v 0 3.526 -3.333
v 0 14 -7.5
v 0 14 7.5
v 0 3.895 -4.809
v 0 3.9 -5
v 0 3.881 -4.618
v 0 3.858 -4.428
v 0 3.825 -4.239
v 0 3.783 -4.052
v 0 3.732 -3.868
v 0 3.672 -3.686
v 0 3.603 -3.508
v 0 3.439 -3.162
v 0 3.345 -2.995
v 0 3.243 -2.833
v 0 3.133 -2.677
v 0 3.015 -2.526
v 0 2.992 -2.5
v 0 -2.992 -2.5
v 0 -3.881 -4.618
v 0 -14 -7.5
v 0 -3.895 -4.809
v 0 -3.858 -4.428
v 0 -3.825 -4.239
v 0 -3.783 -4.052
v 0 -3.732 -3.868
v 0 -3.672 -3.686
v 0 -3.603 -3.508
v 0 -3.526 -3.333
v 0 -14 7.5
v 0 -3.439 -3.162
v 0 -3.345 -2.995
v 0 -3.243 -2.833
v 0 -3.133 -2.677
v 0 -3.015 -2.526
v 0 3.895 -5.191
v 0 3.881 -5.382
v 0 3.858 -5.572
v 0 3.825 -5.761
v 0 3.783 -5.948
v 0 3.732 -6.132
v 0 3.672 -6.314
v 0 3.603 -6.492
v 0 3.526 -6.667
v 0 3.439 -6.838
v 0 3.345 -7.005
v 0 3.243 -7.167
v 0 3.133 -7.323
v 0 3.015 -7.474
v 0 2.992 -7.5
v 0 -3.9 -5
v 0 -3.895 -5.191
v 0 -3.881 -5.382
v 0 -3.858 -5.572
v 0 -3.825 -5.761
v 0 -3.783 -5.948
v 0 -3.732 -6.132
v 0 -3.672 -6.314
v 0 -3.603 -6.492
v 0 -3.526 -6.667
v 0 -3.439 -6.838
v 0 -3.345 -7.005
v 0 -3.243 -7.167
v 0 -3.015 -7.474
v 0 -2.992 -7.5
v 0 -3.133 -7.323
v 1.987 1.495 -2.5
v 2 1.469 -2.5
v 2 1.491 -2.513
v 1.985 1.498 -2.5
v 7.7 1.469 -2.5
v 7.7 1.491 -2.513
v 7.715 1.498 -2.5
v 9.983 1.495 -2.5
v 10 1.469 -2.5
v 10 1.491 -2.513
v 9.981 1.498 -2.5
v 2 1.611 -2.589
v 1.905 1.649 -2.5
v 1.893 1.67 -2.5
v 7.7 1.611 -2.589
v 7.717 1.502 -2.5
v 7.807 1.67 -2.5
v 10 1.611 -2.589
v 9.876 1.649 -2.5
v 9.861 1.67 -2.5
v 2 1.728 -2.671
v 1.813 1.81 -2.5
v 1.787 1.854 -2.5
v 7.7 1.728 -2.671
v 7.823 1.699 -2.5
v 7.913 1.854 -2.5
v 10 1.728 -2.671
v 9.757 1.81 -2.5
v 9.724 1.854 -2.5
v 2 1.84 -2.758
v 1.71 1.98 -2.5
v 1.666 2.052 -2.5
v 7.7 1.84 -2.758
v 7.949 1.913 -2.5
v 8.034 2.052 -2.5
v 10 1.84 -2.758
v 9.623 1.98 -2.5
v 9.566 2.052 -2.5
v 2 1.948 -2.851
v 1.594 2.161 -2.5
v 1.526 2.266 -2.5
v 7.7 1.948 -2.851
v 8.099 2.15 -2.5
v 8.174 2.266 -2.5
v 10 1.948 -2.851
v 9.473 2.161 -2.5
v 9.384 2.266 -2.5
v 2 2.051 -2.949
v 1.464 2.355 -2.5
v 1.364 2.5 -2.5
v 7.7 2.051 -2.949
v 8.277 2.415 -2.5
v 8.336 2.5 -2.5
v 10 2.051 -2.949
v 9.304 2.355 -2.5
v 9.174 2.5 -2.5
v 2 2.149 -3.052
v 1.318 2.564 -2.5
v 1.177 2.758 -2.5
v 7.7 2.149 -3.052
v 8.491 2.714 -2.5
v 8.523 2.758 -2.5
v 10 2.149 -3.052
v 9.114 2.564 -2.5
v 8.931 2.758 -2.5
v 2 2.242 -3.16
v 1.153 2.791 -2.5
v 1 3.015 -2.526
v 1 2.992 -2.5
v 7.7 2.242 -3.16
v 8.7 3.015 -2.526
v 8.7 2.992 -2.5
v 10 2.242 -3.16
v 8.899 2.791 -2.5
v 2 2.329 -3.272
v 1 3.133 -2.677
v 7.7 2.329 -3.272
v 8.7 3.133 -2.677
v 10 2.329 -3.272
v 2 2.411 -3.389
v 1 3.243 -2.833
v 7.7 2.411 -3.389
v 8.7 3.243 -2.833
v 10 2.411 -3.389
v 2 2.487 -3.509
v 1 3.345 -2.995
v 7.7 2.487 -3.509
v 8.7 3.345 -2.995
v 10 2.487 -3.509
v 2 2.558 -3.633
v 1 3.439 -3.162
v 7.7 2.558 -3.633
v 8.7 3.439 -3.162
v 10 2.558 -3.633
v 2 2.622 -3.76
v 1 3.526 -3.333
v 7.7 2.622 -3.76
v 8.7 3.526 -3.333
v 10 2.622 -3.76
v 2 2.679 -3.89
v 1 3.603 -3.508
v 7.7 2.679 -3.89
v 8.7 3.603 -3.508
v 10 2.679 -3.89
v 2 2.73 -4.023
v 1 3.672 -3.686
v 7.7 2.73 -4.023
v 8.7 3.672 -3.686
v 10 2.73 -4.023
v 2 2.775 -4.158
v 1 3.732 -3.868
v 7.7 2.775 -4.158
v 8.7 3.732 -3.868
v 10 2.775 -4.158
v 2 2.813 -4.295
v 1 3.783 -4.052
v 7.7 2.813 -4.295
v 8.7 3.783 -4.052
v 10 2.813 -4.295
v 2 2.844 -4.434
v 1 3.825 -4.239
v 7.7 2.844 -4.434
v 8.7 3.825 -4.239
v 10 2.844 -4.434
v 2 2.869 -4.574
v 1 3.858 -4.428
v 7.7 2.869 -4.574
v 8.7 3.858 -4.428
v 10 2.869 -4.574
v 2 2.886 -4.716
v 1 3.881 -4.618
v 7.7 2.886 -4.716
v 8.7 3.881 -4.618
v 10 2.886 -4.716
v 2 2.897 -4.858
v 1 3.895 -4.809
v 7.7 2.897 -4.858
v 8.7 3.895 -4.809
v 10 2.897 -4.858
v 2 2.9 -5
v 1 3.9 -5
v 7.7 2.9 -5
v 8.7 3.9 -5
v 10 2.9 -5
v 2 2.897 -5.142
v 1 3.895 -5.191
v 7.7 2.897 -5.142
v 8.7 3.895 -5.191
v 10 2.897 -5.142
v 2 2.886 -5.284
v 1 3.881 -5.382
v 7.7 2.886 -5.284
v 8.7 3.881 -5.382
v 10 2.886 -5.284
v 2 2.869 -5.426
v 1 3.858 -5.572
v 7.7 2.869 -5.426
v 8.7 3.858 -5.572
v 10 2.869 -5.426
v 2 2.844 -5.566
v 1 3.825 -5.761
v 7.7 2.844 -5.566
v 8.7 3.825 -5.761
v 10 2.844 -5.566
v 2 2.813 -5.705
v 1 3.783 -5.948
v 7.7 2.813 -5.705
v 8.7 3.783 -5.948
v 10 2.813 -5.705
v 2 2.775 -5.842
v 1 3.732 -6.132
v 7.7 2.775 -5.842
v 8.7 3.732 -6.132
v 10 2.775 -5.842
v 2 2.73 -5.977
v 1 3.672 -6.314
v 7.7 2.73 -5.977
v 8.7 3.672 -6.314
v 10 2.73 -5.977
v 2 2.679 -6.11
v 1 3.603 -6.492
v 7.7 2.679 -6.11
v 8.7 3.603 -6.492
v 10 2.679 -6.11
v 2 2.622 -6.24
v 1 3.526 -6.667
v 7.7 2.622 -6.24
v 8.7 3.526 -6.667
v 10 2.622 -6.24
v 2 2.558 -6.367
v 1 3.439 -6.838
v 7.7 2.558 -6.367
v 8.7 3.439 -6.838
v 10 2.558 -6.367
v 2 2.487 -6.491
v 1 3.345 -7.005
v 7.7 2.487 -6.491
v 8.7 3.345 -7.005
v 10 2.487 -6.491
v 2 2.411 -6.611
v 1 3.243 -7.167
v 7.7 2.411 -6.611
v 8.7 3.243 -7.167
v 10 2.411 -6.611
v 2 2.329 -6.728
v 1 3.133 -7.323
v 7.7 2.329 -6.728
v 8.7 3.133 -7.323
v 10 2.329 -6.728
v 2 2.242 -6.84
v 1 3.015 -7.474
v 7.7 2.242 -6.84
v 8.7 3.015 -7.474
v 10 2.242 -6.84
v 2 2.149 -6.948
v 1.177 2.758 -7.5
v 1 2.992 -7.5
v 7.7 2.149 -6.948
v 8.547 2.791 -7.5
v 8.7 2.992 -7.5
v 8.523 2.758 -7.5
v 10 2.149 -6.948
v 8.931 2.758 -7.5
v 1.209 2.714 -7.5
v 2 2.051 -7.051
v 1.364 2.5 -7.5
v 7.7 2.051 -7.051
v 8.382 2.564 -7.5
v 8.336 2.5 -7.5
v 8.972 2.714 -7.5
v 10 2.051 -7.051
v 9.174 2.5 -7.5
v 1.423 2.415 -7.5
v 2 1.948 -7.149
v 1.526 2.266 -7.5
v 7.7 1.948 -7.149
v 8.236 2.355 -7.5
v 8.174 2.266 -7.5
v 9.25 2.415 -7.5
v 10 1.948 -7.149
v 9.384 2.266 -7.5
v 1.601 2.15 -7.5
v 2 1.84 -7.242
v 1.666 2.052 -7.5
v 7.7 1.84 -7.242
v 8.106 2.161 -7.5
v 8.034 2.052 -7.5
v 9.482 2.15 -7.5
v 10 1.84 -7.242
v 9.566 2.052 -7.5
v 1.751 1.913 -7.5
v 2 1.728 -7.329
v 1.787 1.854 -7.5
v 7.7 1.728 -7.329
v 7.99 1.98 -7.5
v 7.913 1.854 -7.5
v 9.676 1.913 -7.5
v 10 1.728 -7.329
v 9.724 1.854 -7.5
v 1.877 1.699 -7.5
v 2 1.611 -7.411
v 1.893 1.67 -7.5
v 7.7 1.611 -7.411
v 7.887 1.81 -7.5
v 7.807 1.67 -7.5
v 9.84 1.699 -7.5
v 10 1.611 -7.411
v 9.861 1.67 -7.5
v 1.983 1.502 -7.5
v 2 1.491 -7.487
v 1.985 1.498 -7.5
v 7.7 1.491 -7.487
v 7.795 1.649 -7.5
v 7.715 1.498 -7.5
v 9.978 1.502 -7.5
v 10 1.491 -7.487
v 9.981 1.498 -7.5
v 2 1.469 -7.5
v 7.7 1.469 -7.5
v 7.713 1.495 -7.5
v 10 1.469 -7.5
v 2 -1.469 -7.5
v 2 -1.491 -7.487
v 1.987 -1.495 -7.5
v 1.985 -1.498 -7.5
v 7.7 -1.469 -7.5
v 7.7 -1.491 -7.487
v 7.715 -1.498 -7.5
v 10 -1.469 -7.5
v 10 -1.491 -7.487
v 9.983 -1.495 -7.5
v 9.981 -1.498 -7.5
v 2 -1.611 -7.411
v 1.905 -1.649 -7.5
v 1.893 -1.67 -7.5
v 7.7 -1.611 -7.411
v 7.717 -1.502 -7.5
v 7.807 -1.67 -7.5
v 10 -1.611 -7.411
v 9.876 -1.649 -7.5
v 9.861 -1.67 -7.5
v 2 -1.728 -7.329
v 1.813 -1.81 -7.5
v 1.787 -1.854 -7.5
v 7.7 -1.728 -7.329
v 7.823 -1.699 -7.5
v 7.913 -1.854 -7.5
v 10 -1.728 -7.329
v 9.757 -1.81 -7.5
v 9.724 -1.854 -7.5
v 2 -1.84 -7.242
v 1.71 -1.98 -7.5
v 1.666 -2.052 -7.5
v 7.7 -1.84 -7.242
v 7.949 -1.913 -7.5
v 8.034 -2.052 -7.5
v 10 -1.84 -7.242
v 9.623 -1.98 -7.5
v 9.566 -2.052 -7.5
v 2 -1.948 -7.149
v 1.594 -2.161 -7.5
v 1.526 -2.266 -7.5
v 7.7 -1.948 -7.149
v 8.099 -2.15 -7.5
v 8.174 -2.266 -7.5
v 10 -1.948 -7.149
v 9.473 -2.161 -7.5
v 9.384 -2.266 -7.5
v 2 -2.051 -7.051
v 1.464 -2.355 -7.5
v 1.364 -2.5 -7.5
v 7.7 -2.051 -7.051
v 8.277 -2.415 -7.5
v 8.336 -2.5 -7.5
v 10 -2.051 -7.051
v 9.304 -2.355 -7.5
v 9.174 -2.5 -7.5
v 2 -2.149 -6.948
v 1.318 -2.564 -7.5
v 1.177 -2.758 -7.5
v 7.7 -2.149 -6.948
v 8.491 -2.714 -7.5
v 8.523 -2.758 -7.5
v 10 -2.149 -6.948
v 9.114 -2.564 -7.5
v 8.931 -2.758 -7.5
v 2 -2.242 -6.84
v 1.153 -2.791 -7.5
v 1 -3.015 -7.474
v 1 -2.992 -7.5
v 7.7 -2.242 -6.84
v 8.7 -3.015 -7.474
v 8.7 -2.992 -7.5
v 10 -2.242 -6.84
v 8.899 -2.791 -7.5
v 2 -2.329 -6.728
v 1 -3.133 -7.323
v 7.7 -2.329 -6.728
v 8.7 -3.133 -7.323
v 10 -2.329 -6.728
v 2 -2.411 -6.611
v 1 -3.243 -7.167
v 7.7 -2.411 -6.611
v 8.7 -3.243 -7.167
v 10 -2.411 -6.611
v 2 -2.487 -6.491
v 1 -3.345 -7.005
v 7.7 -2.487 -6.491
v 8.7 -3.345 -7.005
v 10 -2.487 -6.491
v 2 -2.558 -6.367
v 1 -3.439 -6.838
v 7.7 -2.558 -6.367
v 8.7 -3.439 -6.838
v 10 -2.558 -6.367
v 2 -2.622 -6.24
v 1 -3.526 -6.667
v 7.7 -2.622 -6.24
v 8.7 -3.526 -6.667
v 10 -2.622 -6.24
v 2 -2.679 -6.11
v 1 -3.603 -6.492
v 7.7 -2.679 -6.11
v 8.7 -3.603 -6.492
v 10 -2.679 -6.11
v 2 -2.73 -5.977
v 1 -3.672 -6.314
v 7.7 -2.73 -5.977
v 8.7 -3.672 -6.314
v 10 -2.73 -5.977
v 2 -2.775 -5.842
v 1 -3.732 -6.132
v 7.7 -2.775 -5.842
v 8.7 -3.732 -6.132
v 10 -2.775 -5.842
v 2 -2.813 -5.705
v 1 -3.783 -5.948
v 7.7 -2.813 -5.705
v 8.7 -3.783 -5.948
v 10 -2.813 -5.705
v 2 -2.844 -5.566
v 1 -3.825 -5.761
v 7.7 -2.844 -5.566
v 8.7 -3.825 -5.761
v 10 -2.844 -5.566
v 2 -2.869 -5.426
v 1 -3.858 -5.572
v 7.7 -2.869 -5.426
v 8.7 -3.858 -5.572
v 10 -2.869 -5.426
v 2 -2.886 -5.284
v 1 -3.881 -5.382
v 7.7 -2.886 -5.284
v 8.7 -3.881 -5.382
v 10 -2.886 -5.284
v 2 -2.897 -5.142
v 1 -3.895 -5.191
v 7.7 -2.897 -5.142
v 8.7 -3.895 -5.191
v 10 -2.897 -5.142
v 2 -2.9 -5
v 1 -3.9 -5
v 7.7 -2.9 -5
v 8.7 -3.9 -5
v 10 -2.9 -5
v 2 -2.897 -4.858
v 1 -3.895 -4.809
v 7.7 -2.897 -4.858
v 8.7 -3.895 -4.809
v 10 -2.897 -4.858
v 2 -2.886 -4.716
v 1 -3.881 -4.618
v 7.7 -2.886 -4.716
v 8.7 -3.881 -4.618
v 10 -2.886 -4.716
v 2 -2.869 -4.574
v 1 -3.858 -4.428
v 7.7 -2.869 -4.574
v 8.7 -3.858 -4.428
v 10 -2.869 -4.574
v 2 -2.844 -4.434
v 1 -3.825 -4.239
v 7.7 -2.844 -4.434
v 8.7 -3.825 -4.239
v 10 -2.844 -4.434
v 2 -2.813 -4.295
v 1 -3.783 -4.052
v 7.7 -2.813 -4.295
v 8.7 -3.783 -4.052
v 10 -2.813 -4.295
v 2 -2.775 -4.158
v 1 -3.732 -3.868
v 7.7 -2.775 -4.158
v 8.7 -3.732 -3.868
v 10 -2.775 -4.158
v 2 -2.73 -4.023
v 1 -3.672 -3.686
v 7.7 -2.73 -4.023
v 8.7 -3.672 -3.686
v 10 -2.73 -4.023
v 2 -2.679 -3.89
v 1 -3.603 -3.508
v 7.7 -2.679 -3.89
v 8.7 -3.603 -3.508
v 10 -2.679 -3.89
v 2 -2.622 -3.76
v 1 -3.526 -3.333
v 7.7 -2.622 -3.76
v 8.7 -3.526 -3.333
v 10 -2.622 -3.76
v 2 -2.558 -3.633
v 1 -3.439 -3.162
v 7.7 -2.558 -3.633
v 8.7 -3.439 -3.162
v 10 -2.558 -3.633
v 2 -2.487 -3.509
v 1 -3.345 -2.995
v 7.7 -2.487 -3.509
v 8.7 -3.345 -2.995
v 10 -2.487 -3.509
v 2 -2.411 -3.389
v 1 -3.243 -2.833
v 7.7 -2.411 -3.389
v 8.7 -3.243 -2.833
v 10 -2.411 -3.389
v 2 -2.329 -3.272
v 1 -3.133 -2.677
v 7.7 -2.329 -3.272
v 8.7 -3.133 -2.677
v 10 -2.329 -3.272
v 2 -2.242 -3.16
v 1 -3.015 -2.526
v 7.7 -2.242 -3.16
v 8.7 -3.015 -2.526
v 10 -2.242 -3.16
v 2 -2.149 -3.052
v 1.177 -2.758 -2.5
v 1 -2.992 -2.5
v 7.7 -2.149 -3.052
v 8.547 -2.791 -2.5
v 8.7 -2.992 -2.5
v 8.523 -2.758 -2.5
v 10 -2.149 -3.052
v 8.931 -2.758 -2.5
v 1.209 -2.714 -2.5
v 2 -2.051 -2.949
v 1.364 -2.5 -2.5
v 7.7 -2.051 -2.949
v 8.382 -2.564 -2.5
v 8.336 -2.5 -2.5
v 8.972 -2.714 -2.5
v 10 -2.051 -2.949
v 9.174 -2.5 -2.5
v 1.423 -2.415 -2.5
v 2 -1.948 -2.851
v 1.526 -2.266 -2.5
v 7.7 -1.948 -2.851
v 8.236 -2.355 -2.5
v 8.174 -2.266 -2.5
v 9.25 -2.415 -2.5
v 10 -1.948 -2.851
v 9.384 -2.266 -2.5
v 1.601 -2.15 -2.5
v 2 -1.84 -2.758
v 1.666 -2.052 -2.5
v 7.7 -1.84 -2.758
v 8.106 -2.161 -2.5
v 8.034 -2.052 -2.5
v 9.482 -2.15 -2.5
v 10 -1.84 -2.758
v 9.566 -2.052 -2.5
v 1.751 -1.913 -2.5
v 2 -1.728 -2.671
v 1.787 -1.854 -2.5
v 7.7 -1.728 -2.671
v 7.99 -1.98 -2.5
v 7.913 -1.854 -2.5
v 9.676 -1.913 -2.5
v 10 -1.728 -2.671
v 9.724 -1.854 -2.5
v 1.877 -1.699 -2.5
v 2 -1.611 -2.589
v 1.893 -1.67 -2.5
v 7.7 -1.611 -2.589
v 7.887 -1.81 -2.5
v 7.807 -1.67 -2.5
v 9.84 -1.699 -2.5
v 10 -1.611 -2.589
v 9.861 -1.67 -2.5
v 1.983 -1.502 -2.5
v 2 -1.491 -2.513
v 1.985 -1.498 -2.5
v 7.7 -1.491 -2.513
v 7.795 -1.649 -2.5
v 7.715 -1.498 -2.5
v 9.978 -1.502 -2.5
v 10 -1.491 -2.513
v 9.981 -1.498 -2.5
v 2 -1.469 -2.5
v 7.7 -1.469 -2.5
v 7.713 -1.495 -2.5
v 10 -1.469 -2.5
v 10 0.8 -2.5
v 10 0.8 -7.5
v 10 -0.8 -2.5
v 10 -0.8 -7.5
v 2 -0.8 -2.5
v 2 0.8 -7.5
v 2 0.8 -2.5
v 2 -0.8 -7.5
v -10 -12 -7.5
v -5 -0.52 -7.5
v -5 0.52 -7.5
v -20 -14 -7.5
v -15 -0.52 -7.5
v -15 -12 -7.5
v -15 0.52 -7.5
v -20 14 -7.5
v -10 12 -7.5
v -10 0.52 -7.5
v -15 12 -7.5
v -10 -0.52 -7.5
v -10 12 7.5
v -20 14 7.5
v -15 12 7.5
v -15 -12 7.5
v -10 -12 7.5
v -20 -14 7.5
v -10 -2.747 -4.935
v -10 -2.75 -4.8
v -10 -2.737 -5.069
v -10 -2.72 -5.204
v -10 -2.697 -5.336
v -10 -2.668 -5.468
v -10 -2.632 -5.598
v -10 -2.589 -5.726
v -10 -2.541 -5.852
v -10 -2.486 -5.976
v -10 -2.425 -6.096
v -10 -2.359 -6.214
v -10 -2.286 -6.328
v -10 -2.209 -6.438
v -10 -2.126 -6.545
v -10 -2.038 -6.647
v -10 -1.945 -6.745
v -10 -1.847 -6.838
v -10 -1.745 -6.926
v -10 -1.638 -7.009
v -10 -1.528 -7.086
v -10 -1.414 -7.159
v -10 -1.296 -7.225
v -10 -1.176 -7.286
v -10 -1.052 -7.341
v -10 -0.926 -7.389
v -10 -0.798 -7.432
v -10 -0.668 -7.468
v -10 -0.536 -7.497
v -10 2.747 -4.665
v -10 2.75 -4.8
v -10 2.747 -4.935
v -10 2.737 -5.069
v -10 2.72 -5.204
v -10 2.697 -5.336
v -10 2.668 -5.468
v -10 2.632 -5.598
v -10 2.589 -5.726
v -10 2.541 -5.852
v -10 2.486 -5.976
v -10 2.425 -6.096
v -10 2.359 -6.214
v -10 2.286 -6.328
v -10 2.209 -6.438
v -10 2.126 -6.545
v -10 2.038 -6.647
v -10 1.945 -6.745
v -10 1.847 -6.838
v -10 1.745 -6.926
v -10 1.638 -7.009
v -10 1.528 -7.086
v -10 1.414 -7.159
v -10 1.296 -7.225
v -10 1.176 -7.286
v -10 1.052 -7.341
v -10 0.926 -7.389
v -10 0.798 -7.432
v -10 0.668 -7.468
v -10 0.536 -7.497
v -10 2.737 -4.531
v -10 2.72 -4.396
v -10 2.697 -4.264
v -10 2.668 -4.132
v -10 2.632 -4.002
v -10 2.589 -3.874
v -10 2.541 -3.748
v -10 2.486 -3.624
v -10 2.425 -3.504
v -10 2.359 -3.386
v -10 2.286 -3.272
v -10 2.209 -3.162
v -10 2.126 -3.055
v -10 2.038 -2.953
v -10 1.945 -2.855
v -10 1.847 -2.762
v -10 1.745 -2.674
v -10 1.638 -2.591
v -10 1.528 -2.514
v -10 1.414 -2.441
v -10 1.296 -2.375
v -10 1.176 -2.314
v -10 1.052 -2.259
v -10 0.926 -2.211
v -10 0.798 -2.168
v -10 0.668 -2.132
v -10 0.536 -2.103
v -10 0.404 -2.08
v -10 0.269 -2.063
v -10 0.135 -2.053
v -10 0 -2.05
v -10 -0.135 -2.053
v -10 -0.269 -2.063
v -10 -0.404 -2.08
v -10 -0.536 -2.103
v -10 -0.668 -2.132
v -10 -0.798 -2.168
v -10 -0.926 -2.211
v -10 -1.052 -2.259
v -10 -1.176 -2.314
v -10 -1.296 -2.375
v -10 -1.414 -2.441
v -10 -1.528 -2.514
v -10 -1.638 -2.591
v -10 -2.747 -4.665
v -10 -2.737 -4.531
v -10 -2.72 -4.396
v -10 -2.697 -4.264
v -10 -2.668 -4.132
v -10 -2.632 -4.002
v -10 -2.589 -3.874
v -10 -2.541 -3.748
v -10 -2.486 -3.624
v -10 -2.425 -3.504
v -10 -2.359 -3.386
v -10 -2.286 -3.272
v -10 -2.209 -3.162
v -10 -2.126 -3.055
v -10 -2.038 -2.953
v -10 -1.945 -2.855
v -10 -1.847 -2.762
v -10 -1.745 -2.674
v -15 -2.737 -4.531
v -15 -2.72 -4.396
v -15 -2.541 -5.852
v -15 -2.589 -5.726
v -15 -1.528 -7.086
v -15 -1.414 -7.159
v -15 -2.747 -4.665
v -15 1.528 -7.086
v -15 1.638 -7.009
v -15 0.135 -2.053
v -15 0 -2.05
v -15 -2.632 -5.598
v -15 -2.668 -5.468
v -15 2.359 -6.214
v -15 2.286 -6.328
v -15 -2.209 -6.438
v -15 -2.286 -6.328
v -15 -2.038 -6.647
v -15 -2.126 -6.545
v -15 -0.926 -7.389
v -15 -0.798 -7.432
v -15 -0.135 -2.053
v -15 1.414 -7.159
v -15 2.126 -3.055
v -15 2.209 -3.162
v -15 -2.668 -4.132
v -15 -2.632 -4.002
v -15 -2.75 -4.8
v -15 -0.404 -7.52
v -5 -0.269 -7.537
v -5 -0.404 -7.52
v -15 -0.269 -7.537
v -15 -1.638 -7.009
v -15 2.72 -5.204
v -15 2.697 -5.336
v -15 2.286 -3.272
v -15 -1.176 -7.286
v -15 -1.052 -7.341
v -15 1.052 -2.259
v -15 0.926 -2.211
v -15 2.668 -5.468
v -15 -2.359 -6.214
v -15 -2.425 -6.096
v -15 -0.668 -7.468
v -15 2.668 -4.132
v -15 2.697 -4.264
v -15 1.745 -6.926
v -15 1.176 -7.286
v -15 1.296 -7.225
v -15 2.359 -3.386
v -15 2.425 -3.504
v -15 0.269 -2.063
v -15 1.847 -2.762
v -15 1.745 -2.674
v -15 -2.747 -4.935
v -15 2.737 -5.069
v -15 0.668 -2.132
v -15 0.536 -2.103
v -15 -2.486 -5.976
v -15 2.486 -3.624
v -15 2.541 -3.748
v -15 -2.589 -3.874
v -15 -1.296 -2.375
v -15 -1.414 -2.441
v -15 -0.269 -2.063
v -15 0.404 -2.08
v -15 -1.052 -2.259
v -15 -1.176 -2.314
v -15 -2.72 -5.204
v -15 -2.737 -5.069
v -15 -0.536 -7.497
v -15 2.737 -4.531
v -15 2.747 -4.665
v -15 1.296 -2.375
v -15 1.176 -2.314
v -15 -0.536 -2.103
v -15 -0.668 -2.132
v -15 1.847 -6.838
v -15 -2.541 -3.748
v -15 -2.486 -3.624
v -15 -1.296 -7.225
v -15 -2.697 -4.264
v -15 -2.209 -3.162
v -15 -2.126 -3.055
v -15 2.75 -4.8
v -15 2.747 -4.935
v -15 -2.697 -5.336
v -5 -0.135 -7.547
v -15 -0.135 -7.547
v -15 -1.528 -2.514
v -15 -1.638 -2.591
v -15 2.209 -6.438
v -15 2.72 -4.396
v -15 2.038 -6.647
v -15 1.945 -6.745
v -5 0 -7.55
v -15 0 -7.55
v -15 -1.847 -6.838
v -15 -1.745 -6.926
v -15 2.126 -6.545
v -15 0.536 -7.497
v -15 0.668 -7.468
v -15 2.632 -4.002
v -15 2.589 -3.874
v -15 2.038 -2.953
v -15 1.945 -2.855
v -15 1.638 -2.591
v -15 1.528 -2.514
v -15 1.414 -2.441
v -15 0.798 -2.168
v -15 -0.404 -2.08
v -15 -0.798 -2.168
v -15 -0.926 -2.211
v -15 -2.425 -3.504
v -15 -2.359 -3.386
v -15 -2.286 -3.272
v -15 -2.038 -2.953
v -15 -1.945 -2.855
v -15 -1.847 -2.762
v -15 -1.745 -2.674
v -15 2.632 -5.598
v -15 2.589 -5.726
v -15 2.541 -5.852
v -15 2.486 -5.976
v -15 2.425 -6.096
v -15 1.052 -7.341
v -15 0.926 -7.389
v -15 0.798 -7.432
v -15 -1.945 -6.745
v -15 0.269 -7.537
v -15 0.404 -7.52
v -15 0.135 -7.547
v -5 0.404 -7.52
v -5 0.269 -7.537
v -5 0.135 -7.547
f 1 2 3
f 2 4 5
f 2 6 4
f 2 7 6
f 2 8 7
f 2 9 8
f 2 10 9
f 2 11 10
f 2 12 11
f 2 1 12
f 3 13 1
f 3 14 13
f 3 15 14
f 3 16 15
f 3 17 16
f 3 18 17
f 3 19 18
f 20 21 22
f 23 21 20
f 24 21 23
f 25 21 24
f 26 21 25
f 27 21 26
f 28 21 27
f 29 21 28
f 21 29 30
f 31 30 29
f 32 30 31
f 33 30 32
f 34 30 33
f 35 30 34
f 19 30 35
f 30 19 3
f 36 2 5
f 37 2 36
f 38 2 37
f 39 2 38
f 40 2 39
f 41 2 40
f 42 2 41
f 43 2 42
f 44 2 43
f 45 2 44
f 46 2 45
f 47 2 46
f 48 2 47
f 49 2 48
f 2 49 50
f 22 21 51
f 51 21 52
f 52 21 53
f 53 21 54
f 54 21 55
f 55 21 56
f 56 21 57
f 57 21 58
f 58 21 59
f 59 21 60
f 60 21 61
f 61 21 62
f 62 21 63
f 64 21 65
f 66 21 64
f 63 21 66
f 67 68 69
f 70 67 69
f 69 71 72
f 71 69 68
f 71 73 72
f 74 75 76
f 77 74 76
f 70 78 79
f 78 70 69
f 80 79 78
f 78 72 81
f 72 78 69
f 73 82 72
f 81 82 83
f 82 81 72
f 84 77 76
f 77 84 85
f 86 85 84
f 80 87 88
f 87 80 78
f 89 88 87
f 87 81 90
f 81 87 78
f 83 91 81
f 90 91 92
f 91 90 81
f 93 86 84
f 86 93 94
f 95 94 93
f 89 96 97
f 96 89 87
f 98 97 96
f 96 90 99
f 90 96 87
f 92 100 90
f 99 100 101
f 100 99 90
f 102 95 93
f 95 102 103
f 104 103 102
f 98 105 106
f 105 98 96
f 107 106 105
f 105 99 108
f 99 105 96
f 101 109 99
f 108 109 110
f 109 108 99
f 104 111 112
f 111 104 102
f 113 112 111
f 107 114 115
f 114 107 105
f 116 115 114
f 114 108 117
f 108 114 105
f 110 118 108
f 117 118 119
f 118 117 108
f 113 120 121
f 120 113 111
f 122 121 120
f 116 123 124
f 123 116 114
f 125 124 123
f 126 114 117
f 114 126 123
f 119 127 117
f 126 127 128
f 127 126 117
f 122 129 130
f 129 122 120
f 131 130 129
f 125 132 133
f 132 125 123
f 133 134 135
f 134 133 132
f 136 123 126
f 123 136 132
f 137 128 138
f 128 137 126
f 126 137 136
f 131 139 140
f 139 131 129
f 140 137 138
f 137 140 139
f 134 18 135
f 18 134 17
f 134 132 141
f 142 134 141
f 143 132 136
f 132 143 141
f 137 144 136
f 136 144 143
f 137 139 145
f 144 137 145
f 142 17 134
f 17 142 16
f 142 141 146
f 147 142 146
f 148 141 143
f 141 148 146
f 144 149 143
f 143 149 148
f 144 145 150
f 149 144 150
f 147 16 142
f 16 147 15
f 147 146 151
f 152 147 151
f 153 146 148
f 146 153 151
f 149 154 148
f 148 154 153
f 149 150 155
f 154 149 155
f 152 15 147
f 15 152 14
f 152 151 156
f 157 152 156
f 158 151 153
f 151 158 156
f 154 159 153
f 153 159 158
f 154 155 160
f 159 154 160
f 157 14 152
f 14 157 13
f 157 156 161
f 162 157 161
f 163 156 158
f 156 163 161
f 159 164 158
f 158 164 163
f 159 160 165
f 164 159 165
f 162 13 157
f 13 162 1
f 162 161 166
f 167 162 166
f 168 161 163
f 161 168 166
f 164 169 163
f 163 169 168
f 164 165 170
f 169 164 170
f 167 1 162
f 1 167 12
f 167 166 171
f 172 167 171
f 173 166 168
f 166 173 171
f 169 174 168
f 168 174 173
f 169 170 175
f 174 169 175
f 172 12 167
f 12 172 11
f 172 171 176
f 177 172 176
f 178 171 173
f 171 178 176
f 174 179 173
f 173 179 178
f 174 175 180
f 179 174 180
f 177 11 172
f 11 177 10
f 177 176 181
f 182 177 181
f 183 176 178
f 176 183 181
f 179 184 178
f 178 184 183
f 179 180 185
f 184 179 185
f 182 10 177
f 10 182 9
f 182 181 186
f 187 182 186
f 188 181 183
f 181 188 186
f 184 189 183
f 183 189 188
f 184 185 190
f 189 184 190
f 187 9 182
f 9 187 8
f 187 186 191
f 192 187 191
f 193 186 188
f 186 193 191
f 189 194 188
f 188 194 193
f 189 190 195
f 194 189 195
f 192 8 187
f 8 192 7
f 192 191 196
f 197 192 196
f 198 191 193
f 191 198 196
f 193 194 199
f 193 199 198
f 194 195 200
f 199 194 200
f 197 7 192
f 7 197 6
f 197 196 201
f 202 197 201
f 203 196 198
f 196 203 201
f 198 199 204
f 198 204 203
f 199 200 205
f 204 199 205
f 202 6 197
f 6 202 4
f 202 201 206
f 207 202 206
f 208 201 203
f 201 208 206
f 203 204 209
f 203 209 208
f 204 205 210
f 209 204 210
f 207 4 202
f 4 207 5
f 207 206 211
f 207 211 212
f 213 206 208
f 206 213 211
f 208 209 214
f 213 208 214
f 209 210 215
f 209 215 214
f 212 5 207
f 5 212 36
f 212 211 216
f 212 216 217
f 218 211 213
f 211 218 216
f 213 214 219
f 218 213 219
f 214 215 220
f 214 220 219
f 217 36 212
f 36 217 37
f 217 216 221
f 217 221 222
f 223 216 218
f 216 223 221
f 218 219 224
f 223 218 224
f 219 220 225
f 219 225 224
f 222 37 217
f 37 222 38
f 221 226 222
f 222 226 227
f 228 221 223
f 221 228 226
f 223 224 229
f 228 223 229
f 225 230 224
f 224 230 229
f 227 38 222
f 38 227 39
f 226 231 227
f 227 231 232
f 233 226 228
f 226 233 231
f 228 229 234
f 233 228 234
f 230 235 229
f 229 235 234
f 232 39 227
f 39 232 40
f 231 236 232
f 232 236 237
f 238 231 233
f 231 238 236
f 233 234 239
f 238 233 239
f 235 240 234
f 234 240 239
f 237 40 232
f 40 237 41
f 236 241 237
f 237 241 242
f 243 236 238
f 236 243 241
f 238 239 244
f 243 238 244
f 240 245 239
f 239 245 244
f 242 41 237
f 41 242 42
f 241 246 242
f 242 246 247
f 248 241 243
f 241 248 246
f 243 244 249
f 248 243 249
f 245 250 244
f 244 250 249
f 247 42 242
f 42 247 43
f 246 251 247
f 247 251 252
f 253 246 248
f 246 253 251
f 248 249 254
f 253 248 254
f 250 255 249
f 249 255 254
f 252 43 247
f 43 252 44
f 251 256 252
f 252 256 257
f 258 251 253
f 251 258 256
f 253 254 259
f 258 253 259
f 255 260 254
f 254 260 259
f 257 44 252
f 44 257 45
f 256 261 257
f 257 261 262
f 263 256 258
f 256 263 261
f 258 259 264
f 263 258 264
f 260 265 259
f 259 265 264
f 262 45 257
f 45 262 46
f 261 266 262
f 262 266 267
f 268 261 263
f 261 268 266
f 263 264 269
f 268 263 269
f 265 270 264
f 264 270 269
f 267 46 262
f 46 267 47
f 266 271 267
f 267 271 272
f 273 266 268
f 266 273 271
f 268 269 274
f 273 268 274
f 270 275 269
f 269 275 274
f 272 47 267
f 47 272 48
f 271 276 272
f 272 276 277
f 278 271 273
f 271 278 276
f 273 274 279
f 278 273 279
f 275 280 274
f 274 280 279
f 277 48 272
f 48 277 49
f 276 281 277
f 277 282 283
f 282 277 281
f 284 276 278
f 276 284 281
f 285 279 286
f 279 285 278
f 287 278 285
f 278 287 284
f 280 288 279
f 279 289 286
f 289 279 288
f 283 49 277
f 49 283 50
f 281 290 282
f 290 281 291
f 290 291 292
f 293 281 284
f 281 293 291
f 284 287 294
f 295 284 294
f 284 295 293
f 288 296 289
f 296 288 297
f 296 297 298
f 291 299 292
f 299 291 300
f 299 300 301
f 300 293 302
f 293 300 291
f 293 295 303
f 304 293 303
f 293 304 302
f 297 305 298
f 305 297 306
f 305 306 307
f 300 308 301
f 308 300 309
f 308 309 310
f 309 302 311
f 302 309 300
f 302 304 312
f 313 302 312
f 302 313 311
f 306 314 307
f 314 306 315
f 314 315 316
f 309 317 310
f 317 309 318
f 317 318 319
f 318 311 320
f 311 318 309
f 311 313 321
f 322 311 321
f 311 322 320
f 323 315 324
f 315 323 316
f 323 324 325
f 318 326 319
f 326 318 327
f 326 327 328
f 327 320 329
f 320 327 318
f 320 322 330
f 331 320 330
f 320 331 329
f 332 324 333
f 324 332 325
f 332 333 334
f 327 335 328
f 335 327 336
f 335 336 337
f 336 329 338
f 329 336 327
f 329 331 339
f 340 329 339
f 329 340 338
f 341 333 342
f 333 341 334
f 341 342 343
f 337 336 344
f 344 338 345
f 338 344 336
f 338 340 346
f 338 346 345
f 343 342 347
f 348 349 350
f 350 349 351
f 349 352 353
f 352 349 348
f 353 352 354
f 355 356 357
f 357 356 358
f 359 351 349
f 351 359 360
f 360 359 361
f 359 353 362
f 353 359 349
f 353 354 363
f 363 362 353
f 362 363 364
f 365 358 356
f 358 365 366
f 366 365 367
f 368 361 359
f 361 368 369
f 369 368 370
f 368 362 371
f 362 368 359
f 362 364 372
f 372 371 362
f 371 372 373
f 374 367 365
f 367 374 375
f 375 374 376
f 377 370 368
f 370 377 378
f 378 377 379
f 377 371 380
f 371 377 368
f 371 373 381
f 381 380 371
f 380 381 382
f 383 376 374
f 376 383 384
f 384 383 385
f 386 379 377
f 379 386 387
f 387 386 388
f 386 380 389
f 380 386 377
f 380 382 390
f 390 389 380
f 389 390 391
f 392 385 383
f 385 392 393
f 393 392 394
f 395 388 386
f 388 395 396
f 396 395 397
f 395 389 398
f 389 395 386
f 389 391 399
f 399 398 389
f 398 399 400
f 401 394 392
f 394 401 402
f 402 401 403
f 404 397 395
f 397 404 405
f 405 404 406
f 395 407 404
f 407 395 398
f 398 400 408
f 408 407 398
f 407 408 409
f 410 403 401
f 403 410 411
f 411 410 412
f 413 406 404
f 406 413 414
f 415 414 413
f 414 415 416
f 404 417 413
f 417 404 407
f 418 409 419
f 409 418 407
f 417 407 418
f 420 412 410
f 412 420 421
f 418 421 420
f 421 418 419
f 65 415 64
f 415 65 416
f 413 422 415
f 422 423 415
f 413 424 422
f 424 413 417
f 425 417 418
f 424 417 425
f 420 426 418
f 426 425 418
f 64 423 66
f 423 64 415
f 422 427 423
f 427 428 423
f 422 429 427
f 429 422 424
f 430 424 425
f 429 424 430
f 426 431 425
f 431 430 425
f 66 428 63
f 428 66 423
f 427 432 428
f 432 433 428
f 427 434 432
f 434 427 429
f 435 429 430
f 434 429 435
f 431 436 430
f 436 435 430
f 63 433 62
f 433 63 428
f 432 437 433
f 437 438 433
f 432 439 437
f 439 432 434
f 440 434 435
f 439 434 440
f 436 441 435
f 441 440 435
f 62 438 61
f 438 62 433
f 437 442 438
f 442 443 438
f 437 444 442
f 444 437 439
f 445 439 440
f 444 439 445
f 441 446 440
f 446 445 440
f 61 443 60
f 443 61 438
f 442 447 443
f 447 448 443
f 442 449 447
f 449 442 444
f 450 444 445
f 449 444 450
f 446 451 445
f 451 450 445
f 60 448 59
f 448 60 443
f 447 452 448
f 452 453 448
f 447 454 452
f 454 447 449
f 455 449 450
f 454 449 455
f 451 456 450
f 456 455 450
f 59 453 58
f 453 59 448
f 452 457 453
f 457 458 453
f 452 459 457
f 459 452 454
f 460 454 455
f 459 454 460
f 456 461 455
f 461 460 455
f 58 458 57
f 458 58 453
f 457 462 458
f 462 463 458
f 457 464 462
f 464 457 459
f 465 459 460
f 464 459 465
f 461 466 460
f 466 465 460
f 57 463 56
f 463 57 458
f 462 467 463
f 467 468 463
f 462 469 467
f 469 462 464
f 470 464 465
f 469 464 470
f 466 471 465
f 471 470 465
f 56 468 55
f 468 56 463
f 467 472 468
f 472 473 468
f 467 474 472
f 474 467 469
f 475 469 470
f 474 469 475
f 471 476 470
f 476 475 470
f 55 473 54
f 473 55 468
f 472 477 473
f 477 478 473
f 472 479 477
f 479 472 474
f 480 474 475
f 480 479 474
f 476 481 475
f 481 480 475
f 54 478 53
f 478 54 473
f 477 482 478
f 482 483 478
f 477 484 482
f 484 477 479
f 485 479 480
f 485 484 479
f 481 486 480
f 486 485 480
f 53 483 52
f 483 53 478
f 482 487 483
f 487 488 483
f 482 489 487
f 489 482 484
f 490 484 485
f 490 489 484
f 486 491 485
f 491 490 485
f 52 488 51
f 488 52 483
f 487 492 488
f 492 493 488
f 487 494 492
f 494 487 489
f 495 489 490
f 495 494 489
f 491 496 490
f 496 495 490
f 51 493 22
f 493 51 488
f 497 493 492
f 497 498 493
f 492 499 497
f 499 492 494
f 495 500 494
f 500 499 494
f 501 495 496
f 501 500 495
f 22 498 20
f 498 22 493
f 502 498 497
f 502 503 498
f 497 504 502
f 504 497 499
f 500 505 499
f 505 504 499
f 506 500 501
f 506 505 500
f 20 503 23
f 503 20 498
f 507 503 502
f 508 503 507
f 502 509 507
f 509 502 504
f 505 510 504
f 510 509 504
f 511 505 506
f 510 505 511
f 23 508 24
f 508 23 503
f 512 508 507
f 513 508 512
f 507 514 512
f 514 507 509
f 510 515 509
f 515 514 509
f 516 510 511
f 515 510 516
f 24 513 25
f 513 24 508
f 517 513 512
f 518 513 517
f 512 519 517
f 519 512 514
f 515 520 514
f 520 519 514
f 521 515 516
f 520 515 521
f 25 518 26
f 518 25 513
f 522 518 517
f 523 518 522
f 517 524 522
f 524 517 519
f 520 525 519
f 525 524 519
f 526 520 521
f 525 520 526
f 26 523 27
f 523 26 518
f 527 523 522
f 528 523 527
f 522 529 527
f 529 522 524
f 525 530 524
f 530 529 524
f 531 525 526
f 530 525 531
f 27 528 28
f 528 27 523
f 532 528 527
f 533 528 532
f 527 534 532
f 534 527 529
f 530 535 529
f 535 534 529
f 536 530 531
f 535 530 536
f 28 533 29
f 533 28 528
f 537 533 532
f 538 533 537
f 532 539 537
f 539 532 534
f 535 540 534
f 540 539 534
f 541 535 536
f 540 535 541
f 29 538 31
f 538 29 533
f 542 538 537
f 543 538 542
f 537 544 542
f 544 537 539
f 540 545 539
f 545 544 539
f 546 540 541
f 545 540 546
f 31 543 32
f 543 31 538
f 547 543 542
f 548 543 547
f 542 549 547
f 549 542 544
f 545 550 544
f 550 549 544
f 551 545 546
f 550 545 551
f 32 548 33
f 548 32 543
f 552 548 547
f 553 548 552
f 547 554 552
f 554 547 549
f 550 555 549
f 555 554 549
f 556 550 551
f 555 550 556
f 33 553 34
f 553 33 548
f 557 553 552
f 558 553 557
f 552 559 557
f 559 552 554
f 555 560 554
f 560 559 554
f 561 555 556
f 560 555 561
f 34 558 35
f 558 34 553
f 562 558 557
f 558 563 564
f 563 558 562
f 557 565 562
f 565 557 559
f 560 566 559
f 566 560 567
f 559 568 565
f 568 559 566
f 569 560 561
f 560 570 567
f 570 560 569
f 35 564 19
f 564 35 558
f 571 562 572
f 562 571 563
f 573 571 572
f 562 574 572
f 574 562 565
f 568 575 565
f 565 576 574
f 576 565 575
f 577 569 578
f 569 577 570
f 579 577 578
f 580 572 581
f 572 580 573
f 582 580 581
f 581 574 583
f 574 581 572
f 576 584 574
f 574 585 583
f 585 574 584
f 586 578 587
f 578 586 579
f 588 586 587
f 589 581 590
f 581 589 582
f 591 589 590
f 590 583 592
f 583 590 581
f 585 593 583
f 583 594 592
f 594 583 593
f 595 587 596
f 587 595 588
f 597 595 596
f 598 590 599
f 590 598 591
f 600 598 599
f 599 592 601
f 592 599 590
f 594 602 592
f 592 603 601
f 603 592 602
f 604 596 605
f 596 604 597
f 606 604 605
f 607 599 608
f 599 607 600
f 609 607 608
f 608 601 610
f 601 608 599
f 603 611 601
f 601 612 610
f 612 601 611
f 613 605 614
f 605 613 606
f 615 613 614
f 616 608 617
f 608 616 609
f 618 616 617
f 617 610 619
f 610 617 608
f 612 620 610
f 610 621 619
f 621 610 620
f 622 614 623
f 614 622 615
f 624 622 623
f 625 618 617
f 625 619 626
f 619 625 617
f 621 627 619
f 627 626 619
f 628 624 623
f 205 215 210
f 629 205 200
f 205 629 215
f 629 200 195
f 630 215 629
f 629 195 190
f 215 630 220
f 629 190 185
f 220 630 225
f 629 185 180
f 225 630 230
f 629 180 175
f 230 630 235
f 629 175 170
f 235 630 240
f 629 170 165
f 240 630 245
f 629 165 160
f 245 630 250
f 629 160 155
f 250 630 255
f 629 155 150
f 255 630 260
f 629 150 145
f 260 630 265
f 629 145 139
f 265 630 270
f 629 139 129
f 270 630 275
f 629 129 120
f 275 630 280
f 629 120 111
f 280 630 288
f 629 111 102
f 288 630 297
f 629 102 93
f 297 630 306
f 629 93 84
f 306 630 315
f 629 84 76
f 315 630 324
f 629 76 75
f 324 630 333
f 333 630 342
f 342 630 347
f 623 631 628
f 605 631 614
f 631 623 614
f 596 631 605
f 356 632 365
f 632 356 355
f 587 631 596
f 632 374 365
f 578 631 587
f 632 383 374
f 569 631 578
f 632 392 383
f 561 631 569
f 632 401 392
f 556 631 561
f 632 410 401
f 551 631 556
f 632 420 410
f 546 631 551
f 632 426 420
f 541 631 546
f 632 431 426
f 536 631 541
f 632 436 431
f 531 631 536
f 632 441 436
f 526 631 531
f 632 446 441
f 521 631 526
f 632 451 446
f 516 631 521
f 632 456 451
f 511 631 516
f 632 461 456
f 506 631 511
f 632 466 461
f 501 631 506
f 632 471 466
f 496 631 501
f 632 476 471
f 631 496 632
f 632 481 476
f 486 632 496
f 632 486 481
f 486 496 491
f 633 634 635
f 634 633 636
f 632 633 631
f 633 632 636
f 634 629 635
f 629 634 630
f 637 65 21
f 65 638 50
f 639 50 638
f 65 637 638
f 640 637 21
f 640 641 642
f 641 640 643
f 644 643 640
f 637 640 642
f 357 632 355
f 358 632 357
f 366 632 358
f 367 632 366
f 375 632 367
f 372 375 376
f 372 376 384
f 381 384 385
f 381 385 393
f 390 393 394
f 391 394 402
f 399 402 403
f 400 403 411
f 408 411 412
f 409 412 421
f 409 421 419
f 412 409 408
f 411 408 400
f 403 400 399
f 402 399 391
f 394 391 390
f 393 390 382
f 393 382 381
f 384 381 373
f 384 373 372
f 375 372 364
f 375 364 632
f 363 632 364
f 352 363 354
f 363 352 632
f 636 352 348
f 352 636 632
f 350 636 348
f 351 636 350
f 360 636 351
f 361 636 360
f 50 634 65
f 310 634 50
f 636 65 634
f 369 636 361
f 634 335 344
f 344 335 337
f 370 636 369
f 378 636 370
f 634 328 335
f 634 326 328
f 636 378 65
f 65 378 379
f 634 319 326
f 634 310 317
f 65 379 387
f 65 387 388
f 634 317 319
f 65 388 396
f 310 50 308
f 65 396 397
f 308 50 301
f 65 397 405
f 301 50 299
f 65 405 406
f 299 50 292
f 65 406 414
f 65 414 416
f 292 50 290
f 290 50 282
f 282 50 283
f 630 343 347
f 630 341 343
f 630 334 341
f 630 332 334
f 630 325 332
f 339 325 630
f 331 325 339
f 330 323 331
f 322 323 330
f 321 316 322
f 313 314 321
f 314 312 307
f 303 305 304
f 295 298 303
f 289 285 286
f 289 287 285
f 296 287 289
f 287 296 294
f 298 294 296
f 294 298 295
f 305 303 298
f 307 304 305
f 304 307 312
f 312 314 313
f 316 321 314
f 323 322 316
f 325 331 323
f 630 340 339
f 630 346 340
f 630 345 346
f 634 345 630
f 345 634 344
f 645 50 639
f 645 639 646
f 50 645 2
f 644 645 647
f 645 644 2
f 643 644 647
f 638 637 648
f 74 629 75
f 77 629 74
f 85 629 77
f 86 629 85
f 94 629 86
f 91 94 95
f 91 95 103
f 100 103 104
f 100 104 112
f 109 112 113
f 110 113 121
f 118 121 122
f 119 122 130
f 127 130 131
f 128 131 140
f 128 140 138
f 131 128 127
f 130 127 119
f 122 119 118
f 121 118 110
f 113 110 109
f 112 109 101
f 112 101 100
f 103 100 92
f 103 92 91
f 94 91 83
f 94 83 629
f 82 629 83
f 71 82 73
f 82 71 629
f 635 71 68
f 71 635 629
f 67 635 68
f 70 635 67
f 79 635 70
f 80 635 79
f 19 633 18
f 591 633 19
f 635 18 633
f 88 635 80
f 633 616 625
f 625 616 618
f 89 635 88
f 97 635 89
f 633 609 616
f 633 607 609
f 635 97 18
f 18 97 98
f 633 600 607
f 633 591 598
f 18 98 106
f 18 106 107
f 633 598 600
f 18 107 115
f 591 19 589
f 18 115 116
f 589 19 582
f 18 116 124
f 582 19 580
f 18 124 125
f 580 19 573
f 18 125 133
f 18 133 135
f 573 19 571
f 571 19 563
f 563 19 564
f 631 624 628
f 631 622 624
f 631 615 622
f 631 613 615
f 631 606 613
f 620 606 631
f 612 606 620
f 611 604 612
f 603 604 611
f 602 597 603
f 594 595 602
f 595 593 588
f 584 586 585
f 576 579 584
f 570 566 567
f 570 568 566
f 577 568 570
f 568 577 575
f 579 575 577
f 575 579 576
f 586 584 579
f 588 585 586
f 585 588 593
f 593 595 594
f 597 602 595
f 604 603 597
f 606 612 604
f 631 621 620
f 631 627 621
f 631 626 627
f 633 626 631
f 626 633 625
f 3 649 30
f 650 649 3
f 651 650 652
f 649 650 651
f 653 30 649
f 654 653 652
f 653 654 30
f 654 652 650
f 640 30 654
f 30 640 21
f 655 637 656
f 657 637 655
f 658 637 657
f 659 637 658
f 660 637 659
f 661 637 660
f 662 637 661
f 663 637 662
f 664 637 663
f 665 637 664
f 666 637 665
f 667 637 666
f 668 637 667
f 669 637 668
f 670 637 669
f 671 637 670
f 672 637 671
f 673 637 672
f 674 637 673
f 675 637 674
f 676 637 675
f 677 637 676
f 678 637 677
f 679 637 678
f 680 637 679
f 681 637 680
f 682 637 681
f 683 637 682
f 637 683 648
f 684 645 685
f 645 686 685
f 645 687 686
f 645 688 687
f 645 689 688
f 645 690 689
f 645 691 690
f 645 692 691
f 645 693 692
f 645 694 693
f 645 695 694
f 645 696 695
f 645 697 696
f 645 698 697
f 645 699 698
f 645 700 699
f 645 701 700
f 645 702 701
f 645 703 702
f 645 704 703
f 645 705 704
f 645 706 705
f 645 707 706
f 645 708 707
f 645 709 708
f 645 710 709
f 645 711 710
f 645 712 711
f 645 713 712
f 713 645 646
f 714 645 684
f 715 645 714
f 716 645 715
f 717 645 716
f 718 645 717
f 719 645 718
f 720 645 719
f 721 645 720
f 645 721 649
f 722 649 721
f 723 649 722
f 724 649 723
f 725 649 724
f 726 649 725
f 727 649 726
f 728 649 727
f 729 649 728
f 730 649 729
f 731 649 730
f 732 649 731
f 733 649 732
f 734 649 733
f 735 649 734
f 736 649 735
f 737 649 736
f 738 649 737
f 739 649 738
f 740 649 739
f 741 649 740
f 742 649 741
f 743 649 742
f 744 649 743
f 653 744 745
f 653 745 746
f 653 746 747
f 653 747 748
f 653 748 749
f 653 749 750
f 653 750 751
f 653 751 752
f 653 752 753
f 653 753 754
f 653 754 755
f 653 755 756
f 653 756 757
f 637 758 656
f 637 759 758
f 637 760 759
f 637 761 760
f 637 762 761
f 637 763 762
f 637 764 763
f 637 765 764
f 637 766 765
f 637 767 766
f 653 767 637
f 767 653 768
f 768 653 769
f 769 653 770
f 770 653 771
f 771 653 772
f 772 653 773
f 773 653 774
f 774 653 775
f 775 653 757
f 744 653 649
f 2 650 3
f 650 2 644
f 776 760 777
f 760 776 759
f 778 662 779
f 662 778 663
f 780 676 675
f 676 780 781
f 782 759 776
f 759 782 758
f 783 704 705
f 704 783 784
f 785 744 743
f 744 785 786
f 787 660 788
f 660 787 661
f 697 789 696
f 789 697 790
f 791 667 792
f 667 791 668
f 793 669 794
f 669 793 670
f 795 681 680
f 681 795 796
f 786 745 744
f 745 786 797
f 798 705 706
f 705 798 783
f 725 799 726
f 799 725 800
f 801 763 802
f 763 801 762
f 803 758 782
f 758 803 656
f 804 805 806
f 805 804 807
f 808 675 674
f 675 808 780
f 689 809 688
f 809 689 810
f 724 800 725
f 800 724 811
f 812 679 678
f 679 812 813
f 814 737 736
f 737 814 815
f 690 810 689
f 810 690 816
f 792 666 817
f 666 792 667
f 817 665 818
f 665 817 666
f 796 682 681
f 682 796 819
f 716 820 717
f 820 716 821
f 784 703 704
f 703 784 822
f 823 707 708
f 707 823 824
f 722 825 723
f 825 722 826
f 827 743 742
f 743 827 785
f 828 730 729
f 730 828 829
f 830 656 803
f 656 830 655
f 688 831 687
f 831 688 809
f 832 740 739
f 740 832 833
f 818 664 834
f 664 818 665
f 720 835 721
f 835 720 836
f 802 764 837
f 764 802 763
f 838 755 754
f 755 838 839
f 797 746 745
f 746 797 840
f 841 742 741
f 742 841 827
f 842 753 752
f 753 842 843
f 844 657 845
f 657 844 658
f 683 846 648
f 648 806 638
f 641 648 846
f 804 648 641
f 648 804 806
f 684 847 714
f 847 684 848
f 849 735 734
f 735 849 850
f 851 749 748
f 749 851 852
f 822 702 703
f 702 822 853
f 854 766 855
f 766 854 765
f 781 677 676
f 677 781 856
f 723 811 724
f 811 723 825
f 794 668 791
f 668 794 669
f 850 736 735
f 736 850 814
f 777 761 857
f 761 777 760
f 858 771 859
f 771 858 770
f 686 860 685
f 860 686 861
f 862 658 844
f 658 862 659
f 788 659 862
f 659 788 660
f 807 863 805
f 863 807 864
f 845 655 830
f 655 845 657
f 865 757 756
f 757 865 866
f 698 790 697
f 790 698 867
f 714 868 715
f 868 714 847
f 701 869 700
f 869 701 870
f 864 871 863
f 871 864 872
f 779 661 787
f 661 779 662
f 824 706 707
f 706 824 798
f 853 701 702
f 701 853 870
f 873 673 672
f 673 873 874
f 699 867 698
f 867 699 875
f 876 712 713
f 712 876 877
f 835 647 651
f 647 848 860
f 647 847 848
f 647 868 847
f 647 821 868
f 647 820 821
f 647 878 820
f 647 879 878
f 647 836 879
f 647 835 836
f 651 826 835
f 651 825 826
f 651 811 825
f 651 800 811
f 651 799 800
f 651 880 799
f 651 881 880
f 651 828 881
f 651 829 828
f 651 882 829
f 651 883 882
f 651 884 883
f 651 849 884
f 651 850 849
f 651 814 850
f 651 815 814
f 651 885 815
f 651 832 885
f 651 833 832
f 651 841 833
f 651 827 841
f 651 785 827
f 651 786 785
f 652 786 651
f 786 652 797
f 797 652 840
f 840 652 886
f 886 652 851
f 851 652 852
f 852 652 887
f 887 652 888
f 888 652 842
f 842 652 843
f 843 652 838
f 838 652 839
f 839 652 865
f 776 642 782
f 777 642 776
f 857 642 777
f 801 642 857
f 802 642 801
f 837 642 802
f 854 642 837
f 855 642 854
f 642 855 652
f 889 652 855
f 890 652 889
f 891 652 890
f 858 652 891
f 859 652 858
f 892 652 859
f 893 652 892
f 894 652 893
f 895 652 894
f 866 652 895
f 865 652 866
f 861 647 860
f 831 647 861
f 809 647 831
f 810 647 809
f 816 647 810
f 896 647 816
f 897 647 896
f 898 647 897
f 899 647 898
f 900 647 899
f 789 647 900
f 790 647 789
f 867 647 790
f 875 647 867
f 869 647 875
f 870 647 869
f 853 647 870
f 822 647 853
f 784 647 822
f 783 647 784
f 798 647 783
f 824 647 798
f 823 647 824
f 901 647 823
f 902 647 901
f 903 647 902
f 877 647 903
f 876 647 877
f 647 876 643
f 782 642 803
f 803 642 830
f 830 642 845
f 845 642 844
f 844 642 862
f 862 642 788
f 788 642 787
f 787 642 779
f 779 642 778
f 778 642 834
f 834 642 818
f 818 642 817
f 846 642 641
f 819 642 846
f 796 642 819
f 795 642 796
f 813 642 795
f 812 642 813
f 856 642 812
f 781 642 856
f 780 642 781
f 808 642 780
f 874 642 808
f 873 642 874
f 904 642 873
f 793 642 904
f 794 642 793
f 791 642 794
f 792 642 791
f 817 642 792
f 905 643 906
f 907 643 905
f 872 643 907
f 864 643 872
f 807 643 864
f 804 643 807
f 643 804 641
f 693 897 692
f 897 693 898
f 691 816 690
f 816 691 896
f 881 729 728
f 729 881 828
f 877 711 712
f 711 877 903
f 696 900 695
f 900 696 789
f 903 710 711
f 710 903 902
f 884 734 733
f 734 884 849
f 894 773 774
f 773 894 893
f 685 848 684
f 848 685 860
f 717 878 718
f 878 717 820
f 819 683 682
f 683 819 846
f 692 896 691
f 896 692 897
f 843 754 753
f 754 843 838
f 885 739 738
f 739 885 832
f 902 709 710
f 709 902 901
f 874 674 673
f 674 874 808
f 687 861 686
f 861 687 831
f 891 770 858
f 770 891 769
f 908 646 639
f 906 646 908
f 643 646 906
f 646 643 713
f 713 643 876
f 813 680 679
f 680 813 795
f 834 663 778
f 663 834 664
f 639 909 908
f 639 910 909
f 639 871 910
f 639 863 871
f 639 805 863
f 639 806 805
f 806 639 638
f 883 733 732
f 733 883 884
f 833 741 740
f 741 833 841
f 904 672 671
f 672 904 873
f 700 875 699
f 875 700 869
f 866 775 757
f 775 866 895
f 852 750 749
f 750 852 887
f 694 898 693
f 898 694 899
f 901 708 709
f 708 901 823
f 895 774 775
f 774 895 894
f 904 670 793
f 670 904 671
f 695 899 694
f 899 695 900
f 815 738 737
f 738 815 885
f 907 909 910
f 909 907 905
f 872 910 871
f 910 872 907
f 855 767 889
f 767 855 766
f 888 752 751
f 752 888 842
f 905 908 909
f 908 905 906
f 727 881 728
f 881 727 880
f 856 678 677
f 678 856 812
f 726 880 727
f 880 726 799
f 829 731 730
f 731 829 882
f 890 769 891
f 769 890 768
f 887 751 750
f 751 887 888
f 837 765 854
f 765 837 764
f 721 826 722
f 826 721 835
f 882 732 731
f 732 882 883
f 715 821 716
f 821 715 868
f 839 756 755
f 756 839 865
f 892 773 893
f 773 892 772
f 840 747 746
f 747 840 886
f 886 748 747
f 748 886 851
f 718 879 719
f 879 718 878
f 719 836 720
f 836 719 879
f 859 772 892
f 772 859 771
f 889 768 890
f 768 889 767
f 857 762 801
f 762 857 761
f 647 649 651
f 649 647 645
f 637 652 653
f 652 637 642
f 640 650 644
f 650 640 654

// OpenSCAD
rotate([0.0, -90.0, 0.0])
{
    union()
    {
        rotate([0.0, 90.0, 0.0])
        {
            translate([0.0, 0.0, -5.0])
            {
                rotate([0.0, 90.0, 0.0])
                {
                    intersection()
                    {
                        difference()
                        {
                            rotate_extrude(angle = 360.0, $fn = 128)
                            {
                                M66();
                            }
                            translate([0.0, 0.0, 2.0])
                            {
                                linear_extrude(height = 10.0, twist = 0.0, scale = 1.0, slices = 1, center = false)
                                {
                                    scale([10.0, 1.6])
                                    {
                                        M8();
                                    }
                                }
                            }
                        }
                        linear_extrude(height = 10.0, twist = 0.0, scale = 1.0, slices = 1, center = false)
                        {
                            scale([5.0, 10.0])
                            {
                                M8();
                            }
                        }
                    }
                }
            }
        }
        translate([0.0, 0.0, 0.0])
        {
            linear_extrude(height = 10.0, twist = 0.0, scale = 1.0, slices = 1, center = false)
            {
                scale([15.0, 28.0])
                {
                    M8();
                }
            }
        }
        translate([-4.8, 0.0, 5.0])
        {
            translate([0.0, 0.0, 5.0])
            {
                linear_extrude(height = 10.0, twist = 0.0, scale = 1.0, slices = 1, center = true)
                {
                    scale([5.5, 5.5])
                    {
                        M211();
                    }
                }
            }
        }
        translate([0.0, 13.0, 10.0])
        {
            linear_extrude(height = 5.0, twist = 0.0, scale = 1.0, slices = 1, center = false)
            {
                scale([15.0, 2.0])
                {
                    M8();
                }
            }
        }
        translate([0.0, -13.0, 10.0])
        {
            linear_extrude(height = 5.0, twist = 0.0, scale = 1.0, slices = 1, center = false)
            {
                scale([15.0, 2.0])
                {
                    M8();
                }
            }
        }
        translate([0.0, 0.0, 15.0])
        {
            linear_extrude(height = 5.0, twist = 0.0, scale = 1.0, slices = 1, center = false)
            {
                scale([15.0, 28.0])
                {
                    M8();
                }
            }
        }
    }
}

module M66()
{
    polygon
    (
        points =
        [
            [0.0, 0.0], 
            [3.9, 0.0], 
            [3.9, 1.0], 
            [2.9, 2.0], 
            [2.9, 7.7], 
            [3.9, 8.7], 
            [2.9, 10.0], 
            [0.0, 10.0], 
            [0.0, 2.0]
        ],
        paths =
        [
            [0, 1, 2, 3, 4, 5, 6, 7, 8]
        ]
    );
}

module M211()
{
    polygon
    (
        points =
        [
            [0.5, 0.0], 
            [0.4993977281025862, 0.024533837163709007], 
            [0.49759236333609846, 0.0490085701647803], 
            [0.4945882549823905, 0.07336523722768087], 
            [0.4903926402016152, 0.09754516100806412], 
            [0.485015626597272, 0.12149008995163194], 
            [0.4784701678661044, 0.14514233862723117], 
            [0.4707720325915104, 0.16844492669611003], 
            [0.46193976625564337, 0.1913417161825449], 
            [0.45199464656172167, 0.21377754671514104], 
            [0.4409606321741775, 0.23569836841299882], 
            [0.42886430500013606, 0.25705137209661083], 
            [0.4157348061512726, 0.2777851165098011], 
            [0.40160376574032247, 0.2978496522462167], 
            [0.3865052266813685, 0.31719664208182274], 
            [0.37047556267747955, 0.33577947742350917], 
            [0.3535533905932738, 0.35355339059327373], 
            [0.33577947742350917, 0.37047556267747955], 
            [0.31719664208182274, 0.3865052266813685], 
            [0.29784965224621673, 0.4016037657403224], 
            [0.27778511650980114, 0.4157348061512726], 
            [0.25705137209661083, 0.42886430500013606], 
            [0.2356983684129989, 0.44096063217417747], 
            [0.2137775467151411, 0.45199464656172167], 
            [0.19134171618254492, 0.46193976625564337], 
            [0.16844492669611003, 0.4707720325915104], 
            [0.14514233862723117, 0.47847016786610447], 
            [0.12149008995163199, 0.485015626597272], 
            [0.09754516100806417, 0.4903926402016152], 
            [0.07336523722768087, 0.4945882549823905], 
            [0.049008570164780385, 0.4975923633360984], 
            [0.024533837163709063, 0.4993977281025862], 
            [3.061616997868383E-17, 0.5], 
            [-0.024533837163709004, 0.4993977281025862], 
            [-0.04900857016478032, 0.49759236333609846], 
            [-0.07336523722768082, 0.4945882549823905], 
            [-0.0975451610080641, 0.4903926402016152], 
            [-0.12149008995163194, 0.485015626597272], 
            [-0.14514233862723108, 0.47847016786610447], 
            [-0.16844492669610997, 0.4707720325915104], 
            [-0.19134171618254486, 0.46193976625564337], 
            [-0.21377754671514093, 0.4519946465617217], 
            [-0.23569836841299885, 0.4409606321741775], 
            [-0.25705137209661083, 0.42886430500013606], 
            [-0.277785116509801, 0.41573480615127273], 
            [-0.2978496522462167, 0.40160376574032247], 
            [-0.3171966420818227, 0.38650522668136855], 
            [-0.3357794774235092, 0.3704755626774795], 
            [-0.35355339059327373, 0.3535533905932738], 
            [-0.37047556267747944, 0.3357794774235093], 
            [-0.3865052266813685, 0.31719664208182274], 
            [-0.4016037657403224, 0.29784965224621673], 
            [-0.4157348061512727, 0.2777851165098011], 
            [-0.428864305000136, 0.2570513720966109], 
            [-0.44096063217417747, 0.23569836841299893], 
            [-0.45199464656172167, 0.21377754671514101], 
            [-0.46193976625564337, 0.19134171618254495], 
            [-0.47077203259151035, 0.16844492669611016], 
            [-0.4784701678661044, 0.1451423386272312], 
            [-0.485015626597272, 0.12149008995163203], 
            [-0.4903926402016152, 0.0975451610080643], 
            [-0.4945882549823905, 0.0733652372276809], 
            [-0.4975923633360984, 0.04900857016478041], 
            [-0.4993977281025862, 0.024533837163708983], 
            [-0.5, 6.123233995736766E-17], 
            [-0.4993977281025862, -0.024533837163708862], 
            [-0.49759236333609846, -0.049008570164780295], 
            [-0.4945882549823905, -0.07336523722768079], 
            [-0.4903926402016152, -0.09754516100806418], 
            [-0.485015626597272, -0.12149008995163191], 
            [-0.47847016786610447, -0.14514233862723105], 
            [-0.4707720325915104, -0.16844492669611005], 
            [-0.4619397662556434, -0.19134171618254484], 
            [-0.4519946465617217, -0.2137775467151409], 
            [-0.4409606321741775, -0.23569836841299882], 
            [-0.42886430500013606, -0.2570513720966108], 
            [-0.41573480615127273, -0.277785116509801], 
            [-0.40160376574032247, -0.2978496522462166], 
            [-0.38650522668136855, -0.31719664208182263], 
            [-0.37047556267747955, -0.3357794774235092], 
            [-0.35355339059327384, -0.35355339059327373], 
            [-0.33577947742350933, -0.37047556267747944], 
            [-0.31719664208182297, -0.38650522668136833], 
            [-0.29784965224621657, -0.4016037657403225], 
            [-0.2777851165098011, -0.4157348061512726], 
            [-0.2570513720966109, -0.428864305000136], 
            [-0.23569836841299893, -0.44096063217417747], 
            [-0.21377754671514124, -0.45199464656172156], 
            [-0.19134171618254517, -0.46193976625564326], 
            [-0.16844492669610997, -0.4707720325915104], 
            [-0.14514233862723122, -0.4784701678661044], 
            [-0.12149008995163206, -0.485015626597272], 
            [-0.09754516100806433, -0.49039264020161516], 
            [-0.07336523722768115, -0.49458825498239045], 
            [-0.049008570164780225, -0.49759236333609846], 
            [-0.024533837163709014, -0.4993977281025862], 
            [-9.184850993605148E-17, -0.5], 
            [0.02453383716370883, -0.4993977281025862], 
            [0.049008570164780045, -0.49759236333609846], 
            [0.07336523722768097, -0.49458825498239045], 
            [0.09754516100806415, -0.4903926402016152], 
            [0.12149008995163188, -0.485015626597272], 
            [0.14514233862723103, -0.47847016786610447], 
            [0.1684449266961098, -0.47077203259151046], 
            [0.191341716182545, -0.4619397662556433], 
            [0.21377754671514107, -0.45199464656172167], 
            [0.2356983684129988, -0.4409606321741775], 
            [0.2570513720966108, -0.4288643050001361], 
            [0.2777851165098009, -0.41573480615127273], 
            [0.29784965224621646, -0.40160376574032264], 
            [0.3171966420818228, -0.38650522668136844], 
            [0.33577947742350917, -0.37047556267747955], 
            [0.3535533905932737, -0.35355339059327384], 
            [0.37047556267747944, -0.33577947742350933], 
            [0.38650522668136833, -0.31719664208182297], 
            [0.4016037657403225, -0.2978496522462166], 
            [0.4157348061512726, -0.2777851165098011], 
            [0.428864305000136, -0.25705137209661094], 
            [0.4409606321741774, -0.23569836841299896], 
            [0.45199464656172156, -0.21377754671514126], 
            [0.46193976625564326, -0.1913417161825452], 
            [0.4707720325915104, -0.16844492669611], 
            [0.4784701678661044, -0.14514233862723125], 
            [0.485015626597272, -0.12149008995163209], 
            [0.49039264020161516, -0.09754516100806436], 
            [0.49458825498239045, -0.0733652372276812], 
            [0.49759236333609846, -0.04900857016478025], 
            [0.4993977281025862, -0.024533837163709046]
        ],
        paths =
        [
            [0, 1, 2, 3, 4, 5, 6, 7, 8, 9, 10, 11, 12, 13, 14, 15, 16, 17, 18, 19, 20, 21, 22, 23, 24, 25, 26, 27, 28, 29, 30, 31, 32, 33, 34, 35, 36, 37, 38, 39, 40, 41, 42, 43, 44, 45, 46, 47, 48, 49, 50, 51, 52, 53, 54, 55, 56, 57, 58, 59, 60, 61, 62, 63, 64, 65, 66, 67, 68, 69, 70, 71, 72, 73, 74, 75, 76, 77, 78, 79, 80, 81, 82, 83, 84, 85, 86, 87, 88, 89, 90, 91, 92, 93, 94, 95, 96, 97, 98, 99, 100, 101, 102, 103, 104, 105, 106, 107, 108, 109, 110, 111, 112, 113, 114, 115, 116, 117, 118, 119, 120, 121, 122, 123, 124, 125, 126, 127]
        ]
    );
}

module M8()
{
    polygon
    (
        points =
        [
            [-0.5, -0.5], 
            [0.5, -0.5], 
            [0.5, 0.5], 
            [-0.5, 0.5]
        ],
        paths =
        [
            [0, 1, 2, 3]
        ]
    );
}
